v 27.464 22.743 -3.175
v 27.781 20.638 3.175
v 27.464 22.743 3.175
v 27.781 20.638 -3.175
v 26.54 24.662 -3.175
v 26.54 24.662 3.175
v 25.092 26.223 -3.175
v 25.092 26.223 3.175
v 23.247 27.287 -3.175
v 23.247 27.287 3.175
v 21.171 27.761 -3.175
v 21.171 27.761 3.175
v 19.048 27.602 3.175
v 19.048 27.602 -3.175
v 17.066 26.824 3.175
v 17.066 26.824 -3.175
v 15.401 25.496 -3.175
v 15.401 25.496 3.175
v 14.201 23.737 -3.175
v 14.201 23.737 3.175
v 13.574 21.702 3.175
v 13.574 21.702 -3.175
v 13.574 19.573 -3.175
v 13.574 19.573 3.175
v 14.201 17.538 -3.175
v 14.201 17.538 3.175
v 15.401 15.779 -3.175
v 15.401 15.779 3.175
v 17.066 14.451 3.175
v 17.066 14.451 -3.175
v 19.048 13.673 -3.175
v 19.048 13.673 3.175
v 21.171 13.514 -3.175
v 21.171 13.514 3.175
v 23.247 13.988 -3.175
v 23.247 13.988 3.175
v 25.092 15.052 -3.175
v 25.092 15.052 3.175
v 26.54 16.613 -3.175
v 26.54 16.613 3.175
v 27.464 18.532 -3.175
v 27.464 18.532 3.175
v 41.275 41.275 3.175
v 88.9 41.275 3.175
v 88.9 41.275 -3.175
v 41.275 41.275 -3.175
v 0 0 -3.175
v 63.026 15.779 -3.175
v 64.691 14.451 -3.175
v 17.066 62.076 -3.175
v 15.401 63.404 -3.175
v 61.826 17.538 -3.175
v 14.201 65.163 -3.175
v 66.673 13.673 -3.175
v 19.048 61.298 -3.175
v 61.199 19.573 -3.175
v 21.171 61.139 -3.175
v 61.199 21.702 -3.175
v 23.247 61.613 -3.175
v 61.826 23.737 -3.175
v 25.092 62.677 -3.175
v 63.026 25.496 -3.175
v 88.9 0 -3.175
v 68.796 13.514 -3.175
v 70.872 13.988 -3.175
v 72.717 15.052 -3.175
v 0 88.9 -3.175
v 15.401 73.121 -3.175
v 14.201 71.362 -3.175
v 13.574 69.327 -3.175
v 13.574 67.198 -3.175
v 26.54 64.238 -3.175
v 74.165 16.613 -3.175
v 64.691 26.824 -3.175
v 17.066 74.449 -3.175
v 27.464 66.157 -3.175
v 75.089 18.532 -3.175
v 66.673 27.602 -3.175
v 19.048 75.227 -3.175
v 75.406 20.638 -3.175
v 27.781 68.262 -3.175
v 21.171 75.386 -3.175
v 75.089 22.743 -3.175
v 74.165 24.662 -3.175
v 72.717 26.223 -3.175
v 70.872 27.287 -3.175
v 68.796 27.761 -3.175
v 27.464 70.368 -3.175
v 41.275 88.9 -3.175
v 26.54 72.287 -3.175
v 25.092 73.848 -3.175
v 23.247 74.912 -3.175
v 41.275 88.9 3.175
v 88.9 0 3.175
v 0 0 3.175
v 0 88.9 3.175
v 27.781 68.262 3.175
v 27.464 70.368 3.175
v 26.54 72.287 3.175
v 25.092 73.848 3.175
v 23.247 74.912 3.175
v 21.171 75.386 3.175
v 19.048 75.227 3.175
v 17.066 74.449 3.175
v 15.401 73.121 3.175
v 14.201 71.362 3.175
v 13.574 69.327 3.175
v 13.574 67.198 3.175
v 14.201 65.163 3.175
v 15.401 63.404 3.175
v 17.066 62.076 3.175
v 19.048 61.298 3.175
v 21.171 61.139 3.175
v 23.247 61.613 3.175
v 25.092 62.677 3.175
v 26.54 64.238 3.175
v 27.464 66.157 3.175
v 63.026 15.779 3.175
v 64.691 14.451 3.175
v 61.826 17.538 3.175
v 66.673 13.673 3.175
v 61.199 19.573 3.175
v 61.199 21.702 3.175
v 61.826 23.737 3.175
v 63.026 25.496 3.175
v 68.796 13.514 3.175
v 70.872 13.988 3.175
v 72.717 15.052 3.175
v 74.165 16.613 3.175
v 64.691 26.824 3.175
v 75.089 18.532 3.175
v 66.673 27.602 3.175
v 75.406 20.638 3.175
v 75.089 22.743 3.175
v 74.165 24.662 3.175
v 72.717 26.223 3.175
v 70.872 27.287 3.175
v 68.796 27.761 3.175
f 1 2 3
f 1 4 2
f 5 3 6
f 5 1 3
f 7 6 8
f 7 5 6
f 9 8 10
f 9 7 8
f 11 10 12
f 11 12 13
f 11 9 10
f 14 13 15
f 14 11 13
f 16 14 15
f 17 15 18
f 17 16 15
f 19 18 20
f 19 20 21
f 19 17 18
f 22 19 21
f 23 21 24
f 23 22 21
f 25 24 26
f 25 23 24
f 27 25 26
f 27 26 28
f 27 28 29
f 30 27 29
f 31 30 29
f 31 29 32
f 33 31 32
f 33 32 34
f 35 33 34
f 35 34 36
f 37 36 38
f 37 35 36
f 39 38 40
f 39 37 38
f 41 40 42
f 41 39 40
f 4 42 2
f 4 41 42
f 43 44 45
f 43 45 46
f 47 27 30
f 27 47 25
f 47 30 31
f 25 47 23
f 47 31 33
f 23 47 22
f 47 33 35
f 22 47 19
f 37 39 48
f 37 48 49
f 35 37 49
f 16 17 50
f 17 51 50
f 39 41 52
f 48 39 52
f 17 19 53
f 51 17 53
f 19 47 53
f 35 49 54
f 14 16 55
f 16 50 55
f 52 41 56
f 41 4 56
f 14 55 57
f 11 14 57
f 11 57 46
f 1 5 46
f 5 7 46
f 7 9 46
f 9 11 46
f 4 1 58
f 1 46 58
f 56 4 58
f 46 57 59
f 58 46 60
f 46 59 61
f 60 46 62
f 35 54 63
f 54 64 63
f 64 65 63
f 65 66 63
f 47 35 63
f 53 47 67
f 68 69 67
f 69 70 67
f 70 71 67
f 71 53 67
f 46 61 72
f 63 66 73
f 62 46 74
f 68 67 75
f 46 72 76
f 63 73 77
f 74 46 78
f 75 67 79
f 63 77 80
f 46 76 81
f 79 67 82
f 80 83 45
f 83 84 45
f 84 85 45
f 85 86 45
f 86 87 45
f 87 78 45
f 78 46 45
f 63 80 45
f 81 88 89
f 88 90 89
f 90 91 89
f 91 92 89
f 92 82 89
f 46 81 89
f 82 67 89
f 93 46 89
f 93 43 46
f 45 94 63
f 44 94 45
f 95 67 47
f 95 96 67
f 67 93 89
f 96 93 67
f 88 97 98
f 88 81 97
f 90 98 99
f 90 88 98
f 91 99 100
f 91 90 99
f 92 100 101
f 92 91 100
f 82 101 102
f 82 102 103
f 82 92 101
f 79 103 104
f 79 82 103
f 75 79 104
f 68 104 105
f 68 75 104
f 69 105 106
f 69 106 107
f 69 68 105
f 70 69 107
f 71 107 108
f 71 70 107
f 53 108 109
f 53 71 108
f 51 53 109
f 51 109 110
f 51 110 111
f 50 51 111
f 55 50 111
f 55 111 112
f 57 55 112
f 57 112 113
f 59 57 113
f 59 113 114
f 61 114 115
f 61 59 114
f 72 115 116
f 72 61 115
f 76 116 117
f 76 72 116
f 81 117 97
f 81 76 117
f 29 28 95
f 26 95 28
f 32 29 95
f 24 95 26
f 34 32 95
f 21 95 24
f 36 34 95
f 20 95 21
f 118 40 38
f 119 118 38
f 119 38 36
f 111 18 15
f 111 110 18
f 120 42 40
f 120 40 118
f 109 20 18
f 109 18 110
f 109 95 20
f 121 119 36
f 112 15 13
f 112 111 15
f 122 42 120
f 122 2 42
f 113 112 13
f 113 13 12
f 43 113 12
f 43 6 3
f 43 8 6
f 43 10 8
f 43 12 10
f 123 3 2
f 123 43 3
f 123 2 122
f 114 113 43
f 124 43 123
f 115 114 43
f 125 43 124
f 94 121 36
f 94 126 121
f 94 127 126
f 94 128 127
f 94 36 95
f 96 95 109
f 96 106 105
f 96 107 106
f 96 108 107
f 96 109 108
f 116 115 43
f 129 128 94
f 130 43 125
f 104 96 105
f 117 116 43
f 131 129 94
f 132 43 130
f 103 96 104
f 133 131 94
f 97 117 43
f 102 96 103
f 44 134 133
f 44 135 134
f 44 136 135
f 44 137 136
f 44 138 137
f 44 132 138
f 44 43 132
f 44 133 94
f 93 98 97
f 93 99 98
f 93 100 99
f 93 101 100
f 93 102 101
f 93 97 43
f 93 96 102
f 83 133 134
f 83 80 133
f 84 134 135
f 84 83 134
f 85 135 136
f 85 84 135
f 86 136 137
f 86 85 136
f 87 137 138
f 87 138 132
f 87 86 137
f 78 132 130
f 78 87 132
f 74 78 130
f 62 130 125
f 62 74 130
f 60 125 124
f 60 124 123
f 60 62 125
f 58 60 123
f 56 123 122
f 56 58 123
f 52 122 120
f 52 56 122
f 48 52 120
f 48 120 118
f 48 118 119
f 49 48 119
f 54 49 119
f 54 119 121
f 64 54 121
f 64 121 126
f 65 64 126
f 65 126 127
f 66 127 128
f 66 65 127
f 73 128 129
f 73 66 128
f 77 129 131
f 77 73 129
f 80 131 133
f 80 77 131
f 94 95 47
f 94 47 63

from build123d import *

# Parameters (mm, degrees)
SKETCH1_R           = 7.14375
BOSS_EXTRUDE1_DEPTH = 3.175


with BuildPart() as part:
    # Sketch1 → Boss-Extrude1 (new, symmetric)
    with BuildSketch(Plane.XY):
        Polygon((0, 88.9), (0, 0), (88.9, 0), (88.9, 41.275), (41.275, 41.275), (41.275, 88.9), align=None)
        with Locations((20.6375, 20.6375)):
            Circle(SKETCH1_R, mode=Mode.SUBTRACT)
        with Locations((20.6375, 68.2625)):
            Circle(SKETCH1_R, mode=Mode.SUBTRACT)
        with Locations((68.2625, 20.6375)):
            Circle(SKETCH1_R, mode=Mode.SUBTRACT)
    extrude(amount=BOSS_EXTRUDE1_DEPTH, both=True)


solid = part.part
